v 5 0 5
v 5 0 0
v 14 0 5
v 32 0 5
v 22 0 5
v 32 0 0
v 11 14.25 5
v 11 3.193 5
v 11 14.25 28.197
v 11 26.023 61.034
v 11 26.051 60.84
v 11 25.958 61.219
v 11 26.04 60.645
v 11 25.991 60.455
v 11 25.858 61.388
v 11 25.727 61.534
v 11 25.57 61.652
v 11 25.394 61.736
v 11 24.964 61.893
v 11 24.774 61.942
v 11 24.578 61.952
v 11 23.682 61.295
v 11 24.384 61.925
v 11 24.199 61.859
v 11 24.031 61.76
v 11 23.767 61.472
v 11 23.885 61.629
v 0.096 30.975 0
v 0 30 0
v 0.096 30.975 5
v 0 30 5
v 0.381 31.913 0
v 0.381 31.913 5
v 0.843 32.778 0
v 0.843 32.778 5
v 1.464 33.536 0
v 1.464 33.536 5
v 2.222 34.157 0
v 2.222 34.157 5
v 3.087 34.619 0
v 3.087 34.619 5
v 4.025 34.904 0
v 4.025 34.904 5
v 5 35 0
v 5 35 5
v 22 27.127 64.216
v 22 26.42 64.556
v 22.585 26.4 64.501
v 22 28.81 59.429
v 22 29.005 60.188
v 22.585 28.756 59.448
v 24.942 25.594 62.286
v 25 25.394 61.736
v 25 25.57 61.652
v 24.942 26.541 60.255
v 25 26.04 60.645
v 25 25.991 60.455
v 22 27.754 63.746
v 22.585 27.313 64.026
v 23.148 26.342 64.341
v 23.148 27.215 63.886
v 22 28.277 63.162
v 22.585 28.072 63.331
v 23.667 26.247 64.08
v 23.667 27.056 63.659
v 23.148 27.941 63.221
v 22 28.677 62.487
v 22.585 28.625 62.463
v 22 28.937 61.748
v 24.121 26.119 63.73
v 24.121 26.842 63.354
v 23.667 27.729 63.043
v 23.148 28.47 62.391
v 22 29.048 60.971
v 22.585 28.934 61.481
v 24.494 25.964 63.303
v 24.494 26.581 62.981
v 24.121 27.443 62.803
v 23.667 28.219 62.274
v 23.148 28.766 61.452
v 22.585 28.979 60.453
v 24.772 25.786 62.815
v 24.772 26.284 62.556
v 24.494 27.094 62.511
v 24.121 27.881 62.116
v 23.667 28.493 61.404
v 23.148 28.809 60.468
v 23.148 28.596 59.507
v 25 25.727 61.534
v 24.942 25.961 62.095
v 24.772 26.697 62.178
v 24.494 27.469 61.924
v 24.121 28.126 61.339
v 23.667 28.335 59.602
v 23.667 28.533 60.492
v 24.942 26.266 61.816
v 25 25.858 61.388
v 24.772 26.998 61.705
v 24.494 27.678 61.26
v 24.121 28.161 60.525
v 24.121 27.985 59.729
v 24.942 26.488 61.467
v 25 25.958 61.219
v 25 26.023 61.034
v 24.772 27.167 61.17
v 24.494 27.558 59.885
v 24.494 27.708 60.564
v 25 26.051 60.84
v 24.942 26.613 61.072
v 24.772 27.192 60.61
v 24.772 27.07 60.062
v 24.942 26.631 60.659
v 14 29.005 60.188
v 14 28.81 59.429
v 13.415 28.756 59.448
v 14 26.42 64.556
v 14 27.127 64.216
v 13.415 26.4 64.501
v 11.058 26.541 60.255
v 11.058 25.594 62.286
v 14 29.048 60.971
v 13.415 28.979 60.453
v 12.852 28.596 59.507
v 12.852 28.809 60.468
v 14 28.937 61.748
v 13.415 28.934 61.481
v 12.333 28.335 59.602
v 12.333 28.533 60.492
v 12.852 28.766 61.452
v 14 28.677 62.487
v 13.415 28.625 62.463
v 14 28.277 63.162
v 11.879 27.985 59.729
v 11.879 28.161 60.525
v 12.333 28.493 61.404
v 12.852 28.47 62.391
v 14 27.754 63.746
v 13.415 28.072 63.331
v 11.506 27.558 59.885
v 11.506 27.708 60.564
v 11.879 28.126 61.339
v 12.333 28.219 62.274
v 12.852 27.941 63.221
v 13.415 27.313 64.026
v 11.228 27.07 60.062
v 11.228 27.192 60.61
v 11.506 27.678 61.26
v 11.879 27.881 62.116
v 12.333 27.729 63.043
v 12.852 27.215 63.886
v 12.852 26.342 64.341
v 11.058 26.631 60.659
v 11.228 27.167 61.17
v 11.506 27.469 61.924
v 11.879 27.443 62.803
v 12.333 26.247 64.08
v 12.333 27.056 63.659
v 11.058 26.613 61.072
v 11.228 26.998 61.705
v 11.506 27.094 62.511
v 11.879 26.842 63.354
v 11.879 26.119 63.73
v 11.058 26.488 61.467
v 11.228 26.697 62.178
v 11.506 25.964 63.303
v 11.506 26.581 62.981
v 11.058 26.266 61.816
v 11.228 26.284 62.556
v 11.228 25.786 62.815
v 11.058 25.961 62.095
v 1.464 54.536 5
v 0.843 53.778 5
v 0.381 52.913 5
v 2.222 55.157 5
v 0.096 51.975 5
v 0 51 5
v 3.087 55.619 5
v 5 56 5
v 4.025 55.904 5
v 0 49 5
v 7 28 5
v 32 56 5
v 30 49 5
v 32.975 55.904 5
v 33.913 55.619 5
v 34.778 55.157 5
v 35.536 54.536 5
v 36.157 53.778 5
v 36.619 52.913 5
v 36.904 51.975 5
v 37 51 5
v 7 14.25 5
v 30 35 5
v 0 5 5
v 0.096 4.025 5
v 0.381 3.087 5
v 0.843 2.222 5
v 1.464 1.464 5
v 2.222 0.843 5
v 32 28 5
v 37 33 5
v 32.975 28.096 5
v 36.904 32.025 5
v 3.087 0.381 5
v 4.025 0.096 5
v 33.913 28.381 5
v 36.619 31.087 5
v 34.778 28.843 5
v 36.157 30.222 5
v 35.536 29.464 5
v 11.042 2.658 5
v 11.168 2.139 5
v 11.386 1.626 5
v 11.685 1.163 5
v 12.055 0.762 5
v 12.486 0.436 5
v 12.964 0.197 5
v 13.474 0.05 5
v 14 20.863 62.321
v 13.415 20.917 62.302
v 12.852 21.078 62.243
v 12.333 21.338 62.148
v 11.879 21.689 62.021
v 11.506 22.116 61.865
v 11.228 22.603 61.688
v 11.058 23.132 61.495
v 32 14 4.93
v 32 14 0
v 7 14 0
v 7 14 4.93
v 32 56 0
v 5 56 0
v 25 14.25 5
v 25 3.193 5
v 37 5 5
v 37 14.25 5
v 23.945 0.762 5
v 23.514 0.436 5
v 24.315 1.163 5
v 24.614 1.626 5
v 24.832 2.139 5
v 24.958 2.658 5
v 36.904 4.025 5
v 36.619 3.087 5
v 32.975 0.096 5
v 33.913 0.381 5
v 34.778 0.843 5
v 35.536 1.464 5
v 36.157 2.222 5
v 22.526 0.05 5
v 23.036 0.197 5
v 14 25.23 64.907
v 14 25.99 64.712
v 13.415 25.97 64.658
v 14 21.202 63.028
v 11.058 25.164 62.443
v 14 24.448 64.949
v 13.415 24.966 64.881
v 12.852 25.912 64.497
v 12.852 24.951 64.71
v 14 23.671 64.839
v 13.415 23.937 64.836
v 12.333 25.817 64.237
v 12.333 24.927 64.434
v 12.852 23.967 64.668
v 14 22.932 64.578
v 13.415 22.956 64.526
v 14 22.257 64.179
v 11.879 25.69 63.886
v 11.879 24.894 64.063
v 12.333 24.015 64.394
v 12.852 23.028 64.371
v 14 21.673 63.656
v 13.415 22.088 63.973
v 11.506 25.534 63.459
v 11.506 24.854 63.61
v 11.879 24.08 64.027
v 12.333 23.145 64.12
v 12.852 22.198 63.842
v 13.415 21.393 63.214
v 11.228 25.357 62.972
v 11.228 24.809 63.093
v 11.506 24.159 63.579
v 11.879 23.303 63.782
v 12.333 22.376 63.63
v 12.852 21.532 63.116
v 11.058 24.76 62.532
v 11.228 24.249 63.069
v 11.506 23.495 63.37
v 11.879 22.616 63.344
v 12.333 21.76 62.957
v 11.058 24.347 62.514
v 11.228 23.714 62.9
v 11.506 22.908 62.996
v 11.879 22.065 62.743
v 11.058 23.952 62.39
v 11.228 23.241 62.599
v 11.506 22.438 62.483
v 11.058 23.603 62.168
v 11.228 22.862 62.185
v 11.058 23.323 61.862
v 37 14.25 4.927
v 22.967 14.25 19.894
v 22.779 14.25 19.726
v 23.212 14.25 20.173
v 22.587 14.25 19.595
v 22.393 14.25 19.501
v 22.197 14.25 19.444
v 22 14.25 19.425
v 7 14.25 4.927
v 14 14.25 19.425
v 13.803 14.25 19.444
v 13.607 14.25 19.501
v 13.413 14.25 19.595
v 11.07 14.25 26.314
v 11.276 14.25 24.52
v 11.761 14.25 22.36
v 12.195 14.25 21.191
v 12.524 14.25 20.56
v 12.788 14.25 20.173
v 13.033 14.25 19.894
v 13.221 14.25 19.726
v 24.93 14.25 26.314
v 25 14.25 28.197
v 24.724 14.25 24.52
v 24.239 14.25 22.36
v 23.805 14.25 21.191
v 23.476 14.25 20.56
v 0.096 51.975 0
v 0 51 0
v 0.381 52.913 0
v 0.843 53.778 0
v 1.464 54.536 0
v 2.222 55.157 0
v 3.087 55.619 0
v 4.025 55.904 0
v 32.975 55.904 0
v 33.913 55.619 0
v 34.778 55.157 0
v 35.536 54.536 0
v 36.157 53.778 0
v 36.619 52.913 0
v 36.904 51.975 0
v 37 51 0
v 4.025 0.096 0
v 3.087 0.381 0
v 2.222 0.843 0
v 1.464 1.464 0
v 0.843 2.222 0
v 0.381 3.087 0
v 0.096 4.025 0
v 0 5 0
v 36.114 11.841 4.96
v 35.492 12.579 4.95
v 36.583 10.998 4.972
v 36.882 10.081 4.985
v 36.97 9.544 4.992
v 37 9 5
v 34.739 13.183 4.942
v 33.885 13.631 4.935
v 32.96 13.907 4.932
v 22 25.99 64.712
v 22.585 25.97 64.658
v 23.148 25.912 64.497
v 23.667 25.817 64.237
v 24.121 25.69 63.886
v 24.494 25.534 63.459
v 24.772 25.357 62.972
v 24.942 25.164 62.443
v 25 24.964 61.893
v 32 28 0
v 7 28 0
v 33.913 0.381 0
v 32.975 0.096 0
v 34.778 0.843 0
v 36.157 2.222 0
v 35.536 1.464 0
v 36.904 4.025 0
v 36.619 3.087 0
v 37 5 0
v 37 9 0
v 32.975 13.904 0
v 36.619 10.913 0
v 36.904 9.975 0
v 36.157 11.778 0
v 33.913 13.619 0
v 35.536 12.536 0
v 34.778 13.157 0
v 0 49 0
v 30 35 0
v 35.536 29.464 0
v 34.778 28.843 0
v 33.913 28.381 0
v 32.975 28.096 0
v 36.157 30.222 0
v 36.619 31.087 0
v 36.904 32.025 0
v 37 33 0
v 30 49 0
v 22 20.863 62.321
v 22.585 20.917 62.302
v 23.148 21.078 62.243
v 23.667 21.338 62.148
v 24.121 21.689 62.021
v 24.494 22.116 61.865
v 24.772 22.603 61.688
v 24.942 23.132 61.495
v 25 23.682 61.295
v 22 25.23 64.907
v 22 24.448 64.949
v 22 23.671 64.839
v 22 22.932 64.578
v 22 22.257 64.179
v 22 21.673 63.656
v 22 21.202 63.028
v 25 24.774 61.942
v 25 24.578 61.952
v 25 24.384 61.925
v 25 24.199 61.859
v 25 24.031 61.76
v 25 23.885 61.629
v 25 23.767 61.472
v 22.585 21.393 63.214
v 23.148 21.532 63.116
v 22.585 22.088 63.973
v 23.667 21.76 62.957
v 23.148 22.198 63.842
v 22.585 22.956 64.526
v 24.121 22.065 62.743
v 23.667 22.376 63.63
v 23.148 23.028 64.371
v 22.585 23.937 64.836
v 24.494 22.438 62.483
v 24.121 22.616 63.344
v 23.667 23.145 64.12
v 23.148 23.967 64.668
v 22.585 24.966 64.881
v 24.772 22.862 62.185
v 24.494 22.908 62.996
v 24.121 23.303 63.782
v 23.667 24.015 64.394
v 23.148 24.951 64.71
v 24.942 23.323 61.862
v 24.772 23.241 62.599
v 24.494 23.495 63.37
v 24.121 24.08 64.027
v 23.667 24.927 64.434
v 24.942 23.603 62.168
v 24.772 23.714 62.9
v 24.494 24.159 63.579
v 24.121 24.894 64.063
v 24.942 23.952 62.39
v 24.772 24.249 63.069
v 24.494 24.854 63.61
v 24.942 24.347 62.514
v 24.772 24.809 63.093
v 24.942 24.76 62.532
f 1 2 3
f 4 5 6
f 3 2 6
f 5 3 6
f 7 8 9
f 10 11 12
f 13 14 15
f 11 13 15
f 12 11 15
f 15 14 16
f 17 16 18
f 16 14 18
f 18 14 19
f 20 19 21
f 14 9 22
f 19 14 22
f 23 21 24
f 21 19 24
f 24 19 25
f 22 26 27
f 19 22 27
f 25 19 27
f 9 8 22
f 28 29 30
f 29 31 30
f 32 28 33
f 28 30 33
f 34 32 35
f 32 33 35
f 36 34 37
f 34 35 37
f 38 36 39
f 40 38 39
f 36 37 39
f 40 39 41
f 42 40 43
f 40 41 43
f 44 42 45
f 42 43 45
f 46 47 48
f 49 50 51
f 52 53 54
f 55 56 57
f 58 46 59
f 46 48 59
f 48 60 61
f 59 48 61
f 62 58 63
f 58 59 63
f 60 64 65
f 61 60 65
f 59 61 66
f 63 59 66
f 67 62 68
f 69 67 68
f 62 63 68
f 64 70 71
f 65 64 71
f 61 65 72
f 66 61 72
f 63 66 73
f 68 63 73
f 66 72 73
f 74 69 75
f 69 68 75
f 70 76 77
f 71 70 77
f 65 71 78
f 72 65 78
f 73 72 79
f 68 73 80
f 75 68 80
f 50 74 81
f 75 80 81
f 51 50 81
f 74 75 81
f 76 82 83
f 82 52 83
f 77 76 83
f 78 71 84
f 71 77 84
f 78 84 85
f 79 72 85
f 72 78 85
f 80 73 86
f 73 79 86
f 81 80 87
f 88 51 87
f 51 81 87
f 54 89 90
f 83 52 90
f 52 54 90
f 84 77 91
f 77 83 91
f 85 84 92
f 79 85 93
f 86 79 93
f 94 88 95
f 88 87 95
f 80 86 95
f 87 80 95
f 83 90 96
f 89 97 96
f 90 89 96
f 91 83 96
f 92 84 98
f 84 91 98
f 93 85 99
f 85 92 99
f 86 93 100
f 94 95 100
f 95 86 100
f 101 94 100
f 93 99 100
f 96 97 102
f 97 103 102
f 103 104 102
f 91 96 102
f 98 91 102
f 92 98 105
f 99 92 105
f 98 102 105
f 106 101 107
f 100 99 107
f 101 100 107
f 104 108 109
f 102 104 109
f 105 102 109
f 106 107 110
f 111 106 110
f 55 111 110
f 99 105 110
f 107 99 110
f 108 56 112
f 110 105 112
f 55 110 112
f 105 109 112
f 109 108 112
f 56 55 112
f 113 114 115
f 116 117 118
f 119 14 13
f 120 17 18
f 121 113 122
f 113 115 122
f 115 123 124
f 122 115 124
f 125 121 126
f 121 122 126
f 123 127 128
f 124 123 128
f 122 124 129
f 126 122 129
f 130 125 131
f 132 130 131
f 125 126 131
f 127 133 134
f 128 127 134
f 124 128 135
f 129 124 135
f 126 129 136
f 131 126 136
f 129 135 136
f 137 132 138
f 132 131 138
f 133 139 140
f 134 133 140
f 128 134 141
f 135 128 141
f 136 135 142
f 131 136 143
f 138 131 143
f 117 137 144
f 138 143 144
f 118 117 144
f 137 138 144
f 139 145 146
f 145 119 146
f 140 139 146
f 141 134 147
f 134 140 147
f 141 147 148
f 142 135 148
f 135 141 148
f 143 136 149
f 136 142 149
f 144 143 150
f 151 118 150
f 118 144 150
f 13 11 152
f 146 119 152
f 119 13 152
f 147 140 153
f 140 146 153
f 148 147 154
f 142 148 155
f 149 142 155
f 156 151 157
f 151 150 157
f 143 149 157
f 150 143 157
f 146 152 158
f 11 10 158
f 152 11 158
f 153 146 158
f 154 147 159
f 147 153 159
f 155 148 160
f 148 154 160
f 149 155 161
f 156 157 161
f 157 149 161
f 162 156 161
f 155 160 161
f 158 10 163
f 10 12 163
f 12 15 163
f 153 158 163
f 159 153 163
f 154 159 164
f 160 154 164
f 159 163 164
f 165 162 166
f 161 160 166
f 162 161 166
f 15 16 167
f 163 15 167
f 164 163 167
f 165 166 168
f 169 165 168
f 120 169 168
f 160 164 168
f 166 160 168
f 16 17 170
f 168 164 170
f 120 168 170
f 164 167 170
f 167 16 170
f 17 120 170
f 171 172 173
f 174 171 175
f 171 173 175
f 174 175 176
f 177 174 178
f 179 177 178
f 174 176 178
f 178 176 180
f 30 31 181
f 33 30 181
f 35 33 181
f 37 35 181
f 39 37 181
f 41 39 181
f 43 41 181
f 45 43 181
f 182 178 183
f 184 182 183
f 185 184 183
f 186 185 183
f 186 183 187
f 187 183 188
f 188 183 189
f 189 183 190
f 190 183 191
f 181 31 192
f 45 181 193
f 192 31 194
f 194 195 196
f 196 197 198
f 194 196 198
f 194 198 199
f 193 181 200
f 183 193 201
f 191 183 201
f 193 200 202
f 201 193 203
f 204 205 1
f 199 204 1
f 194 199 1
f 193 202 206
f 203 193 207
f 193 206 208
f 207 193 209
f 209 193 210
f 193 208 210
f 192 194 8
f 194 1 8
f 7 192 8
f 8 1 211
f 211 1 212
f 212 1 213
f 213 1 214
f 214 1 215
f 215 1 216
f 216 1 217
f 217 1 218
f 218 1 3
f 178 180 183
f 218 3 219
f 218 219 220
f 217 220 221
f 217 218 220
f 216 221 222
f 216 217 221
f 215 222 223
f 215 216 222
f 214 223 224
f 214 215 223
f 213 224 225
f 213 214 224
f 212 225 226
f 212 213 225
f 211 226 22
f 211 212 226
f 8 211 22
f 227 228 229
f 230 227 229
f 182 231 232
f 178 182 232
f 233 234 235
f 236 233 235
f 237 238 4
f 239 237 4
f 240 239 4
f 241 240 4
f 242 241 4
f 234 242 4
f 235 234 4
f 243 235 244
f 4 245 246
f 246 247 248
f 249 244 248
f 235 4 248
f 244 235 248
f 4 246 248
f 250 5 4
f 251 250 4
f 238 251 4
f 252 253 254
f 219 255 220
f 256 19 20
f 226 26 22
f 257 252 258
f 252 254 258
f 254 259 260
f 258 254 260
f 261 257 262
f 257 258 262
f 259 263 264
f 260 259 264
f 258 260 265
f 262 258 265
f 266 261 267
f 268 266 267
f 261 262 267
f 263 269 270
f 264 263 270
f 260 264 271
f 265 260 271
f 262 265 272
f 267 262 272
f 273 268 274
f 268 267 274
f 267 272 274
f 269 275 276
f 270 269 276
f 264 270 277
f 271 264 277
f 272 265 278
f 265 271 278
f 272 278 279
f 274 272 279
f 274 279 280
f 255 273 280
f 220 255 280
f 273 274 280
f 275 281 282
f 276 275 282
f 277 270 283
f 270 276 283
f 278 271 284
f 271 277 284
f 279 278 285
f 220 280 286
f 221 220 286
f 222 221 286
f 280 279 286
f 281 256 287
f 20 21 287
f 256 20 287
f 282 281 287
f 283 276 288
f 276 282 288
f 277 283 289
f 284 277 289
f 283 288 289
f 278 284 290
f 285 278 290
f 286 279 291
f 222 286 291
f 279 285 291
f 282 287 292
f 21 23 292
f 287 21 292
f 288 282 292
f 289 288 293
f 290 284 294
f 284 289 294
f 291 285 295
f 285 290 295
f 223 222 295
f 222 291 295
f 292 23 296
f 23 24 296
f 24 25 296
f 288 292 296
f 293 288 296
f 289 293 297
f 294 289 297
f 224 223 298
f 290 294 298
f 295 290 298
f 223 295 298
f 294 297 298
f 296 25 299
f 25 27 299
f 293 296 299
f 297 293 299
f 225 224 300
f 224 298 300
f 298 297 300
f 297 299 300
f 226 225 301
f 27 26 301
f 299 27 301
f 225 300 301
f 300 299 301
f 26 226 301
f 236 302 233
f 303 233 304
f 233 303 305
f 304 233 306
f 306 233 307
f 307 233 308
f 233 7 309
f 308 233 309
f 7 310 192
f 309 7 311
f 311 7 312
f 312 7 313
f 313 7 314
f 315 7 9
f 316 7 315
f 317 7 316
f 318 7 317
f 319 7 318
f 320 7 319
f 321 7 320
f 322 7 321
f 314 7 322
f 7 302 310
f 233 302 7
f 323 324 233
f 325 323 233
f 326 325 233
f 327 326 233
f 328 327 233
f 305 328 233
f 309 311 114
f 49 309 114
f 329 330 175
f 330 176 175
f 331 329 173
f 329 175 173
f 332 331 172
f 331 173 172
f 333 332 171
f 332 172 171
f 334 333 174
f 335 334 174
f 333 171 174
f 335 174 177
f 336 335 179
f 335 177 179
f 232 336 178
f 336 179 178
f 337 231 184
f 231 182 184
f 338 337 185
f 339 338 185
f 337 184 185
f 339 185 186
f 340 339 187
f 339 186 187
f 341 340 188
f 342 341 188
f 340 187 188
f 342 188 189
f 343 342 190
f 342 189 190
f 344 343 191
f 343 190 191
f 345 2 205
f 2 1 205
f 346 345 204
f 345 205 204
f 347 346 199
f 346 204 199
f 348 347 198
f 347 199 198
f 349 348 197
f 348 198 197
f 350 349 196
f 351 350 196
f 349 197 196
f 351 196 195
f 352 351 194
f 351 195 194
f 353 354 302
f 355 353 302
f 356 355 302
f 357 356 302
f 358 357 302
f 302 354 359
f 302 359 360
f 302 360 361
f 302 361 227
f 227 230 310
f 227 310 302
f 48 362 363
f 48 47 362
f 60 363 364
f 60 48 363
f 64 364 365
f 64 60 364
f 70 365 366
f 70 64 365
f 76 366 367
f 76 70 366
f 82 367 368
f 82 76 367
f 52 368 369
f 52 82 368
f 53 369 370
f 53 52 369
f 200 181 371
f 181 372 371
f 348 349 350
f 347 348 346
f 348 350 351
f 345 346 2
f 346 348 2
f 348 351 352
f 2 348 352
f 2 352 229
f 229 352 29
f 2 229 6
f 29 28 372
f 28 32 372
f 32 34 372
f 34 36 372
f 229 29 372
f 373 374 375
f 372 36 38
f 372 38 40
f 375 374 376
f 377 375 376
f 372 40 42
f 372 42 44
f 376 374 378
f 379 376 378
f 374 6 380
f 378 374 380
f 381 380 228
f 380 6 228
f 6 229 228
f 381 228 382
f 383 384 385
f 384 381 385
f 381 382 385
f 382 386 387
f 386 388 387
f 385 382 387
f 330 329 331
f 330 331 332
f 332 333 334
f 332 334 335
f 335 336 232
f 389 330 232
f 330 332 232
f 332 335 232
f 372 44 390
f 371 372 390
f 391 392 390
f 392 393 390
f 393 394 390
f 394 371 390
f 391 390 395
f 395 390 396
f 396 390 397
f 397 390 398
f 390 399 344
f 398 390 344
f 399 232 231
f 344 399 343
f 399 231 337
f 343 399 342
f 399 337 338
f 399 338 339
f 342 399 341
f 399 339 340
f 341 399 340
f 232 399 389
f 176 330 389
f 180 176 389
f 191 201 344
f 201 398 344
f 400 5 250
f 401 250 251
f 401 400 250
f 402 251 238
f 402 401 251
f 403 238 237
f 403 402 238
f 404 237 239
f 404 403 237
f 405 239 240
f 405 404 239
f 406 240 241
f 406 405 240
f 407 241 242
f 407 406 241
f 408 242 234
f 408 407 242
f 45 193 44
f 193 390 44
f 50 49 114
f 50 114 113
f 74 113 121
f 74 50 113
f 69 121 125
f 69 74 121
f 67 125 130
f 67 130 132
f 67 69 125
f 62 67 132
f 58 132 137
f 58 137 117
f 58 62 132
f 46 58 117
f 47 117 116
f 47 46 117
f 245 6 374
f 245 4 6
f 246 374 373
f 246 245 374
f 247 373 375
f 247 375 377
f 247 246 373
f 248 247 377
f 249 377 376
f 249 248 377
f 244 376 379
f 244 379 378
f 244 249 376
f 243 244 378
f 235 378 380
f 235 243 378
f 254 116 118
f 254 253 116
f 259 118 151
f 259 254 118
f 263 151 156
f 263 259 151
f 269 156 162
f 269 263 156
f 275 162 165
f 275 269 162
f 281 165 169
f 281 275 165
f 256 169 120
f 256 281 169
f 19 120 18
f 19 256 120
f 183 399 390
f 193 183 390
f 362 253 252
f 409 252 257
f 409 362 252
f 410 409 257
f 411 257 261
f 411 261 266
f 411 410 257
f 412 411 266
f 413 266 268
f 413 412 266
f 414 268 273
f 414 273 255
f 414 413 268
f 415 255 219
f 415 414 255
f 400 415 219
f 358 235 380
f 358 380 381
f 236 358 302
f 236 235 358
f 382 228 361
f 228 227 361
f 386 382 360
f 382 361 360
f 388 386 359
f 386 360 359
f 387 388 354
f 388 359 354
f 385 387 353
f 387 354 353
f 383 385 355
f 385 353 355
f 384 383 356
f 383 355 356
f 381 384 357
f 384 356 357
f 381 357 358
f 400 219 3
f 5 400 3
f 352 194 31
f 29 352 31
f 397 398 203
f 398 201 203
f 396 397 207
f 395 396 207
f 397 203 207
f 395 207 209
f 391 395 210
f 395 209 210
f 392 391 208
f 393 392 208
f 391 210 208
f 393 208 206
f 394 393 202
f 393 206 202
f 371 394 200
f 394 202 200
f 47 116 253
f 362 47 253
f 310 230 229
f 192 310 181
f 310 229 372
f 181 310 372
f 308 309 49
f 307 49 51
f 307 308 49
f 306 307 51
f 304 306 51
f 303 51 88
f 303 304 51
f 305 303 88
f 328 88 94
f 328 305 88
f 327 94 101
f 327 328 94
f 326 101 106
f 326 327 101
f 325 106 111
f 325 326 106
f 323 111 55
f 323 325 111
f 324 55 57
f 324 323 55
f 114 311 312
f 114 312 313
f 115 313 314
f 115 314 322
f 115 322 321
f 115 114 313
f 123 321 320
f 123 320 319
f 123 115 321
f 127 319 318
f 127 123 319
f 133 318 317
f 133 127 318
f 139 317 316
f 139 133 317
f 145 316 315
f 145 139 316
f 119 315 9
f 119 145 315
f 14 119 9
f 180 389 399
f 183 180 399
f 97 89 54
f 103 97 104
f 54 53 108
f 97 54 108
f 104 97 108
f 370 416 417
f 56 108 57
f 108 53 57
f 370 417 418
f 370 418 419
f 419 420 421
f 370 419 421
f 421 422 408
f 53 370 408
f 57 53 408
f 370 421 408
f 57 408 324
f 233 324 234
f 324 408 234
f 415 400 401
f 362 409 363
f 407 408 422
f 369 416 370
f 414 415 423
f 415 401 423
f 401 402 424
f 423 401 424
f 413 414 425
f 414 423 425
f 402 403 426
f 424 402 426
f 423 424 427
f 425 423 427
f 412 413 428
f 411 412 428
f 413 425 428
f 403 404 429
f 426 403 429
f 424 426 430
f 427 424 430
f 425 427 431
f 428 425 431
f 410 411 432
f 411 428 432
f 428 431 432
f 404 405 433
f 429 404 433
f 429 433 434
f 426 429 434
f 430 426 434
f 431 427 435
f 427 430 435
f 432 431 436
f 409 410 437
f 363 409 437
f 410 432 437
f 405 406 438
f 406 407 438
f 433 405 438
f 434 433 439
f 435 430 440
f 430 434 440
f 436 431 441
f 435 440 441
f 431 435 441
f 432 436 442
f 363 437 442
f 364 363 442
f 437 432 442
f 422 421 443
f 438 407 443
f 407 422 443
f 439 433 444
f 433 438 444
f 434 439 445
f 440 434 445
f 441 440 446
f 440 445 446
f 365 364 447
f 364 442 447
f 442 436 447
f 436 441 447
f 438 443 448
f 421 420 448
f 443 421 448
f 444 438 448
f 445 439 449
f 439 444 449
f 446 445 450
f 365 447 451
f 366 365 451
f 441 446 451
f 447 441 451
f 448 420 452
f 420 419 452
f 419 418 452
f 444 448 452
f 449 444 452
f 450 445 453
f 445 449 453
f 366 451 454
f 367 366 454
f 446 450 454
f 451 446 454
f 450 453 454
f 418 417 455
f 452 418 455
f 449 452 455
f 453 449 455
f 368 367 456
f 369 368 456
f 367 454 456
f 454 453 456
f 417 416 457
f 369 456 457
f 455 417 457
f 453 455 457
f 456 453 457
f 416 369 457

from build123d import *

# Parameters (mm, degrees)
F1_DEPTH = 5
F3_DEPTH = 37
F5_DEPTH = 36.2749
F6_R     = 4
F7_R     = 3
F8_R     = 4.99999


# Not quite as in the source:
# - a fillet or chamfer is up to 0.001 mm smaller than in the source, because OpenCascade refuses the exact size


with BuildPart() as f1:
    # F0 (on Top) → F1 (new body)
    with BuildSketch(Plane.XY):
        Polygon((0, 35), (0, 0), (37, 0), (37, 14), (7, 14), (7, 28), (37, 28), (37, 35), (37, 56), (0, 56), (0, 49), (30, 49), (30, 35), align=None)
    extrude(amount=F1_DEPTH)

    # F2 (on Right) → F3 (join)
    with BuildSketch(Plane.YZ):
        Polygon((22.2313093162, 66.0800203511), (0, 5), (9, 5), (14.2503125495, 4.9267373979), (14.2503125495, 19.4251151749), (30.1785093102, 63.1874761075), align=None)
    extrude(amount=F3_DEPTH)

    # F4 (on Front) → F5 (cut)
    with BuildSketch(Plane.XZ):
        Polygon((11, 5), (11, 66.0800203511), (25, 66.0800203511), (25, 5), (61.9937415394, 5), (61.9937415394, 77.6014764043), (-15.3317964795, 77.6014764043), (-15.3317964795, 5), align=None)
    extrude(amount=-F5_DEPTH, mode=Mode.SUBTRACT)

    # F6
    f6_edges = [f1.edges().sort_by_distance(p)[0] for p in [
        (18, 22.231309, 66.08002),
        (18, 30.178509, 63.187476),
    ]]
    fillet(f6_edges, radius=F6_R)

    # F7
    f7_edges = [f1.edges().sort_by_distance(p)[0] for p in [
        (11, 21.530371, 39.42691),
        (11, 10.431614, 33.660625),
        (25, 21.530371, 39.42691),
        (25, 10.431614, 33.660625),
    ]]
    fillet(f7_edges, radius=F7_R)

    # F8 (radius 5 in the source; OpenCascade refuses exactly that, so slightly less here)
    f8_edges = [f1.edges().sort_by_distance(p)[0] for p in [
        (37, 0, 2.5),
        (37, 28, 2.5),
        (37, 14, 2.465115),
        (0, 0, 2.5),
        (0, 35, 2.5),
        (0, 56, 2.5),
        (37, 56, 2.5),
    ]]
    fillet(f8_edges, radius=F8_R)


solid = f1.part
